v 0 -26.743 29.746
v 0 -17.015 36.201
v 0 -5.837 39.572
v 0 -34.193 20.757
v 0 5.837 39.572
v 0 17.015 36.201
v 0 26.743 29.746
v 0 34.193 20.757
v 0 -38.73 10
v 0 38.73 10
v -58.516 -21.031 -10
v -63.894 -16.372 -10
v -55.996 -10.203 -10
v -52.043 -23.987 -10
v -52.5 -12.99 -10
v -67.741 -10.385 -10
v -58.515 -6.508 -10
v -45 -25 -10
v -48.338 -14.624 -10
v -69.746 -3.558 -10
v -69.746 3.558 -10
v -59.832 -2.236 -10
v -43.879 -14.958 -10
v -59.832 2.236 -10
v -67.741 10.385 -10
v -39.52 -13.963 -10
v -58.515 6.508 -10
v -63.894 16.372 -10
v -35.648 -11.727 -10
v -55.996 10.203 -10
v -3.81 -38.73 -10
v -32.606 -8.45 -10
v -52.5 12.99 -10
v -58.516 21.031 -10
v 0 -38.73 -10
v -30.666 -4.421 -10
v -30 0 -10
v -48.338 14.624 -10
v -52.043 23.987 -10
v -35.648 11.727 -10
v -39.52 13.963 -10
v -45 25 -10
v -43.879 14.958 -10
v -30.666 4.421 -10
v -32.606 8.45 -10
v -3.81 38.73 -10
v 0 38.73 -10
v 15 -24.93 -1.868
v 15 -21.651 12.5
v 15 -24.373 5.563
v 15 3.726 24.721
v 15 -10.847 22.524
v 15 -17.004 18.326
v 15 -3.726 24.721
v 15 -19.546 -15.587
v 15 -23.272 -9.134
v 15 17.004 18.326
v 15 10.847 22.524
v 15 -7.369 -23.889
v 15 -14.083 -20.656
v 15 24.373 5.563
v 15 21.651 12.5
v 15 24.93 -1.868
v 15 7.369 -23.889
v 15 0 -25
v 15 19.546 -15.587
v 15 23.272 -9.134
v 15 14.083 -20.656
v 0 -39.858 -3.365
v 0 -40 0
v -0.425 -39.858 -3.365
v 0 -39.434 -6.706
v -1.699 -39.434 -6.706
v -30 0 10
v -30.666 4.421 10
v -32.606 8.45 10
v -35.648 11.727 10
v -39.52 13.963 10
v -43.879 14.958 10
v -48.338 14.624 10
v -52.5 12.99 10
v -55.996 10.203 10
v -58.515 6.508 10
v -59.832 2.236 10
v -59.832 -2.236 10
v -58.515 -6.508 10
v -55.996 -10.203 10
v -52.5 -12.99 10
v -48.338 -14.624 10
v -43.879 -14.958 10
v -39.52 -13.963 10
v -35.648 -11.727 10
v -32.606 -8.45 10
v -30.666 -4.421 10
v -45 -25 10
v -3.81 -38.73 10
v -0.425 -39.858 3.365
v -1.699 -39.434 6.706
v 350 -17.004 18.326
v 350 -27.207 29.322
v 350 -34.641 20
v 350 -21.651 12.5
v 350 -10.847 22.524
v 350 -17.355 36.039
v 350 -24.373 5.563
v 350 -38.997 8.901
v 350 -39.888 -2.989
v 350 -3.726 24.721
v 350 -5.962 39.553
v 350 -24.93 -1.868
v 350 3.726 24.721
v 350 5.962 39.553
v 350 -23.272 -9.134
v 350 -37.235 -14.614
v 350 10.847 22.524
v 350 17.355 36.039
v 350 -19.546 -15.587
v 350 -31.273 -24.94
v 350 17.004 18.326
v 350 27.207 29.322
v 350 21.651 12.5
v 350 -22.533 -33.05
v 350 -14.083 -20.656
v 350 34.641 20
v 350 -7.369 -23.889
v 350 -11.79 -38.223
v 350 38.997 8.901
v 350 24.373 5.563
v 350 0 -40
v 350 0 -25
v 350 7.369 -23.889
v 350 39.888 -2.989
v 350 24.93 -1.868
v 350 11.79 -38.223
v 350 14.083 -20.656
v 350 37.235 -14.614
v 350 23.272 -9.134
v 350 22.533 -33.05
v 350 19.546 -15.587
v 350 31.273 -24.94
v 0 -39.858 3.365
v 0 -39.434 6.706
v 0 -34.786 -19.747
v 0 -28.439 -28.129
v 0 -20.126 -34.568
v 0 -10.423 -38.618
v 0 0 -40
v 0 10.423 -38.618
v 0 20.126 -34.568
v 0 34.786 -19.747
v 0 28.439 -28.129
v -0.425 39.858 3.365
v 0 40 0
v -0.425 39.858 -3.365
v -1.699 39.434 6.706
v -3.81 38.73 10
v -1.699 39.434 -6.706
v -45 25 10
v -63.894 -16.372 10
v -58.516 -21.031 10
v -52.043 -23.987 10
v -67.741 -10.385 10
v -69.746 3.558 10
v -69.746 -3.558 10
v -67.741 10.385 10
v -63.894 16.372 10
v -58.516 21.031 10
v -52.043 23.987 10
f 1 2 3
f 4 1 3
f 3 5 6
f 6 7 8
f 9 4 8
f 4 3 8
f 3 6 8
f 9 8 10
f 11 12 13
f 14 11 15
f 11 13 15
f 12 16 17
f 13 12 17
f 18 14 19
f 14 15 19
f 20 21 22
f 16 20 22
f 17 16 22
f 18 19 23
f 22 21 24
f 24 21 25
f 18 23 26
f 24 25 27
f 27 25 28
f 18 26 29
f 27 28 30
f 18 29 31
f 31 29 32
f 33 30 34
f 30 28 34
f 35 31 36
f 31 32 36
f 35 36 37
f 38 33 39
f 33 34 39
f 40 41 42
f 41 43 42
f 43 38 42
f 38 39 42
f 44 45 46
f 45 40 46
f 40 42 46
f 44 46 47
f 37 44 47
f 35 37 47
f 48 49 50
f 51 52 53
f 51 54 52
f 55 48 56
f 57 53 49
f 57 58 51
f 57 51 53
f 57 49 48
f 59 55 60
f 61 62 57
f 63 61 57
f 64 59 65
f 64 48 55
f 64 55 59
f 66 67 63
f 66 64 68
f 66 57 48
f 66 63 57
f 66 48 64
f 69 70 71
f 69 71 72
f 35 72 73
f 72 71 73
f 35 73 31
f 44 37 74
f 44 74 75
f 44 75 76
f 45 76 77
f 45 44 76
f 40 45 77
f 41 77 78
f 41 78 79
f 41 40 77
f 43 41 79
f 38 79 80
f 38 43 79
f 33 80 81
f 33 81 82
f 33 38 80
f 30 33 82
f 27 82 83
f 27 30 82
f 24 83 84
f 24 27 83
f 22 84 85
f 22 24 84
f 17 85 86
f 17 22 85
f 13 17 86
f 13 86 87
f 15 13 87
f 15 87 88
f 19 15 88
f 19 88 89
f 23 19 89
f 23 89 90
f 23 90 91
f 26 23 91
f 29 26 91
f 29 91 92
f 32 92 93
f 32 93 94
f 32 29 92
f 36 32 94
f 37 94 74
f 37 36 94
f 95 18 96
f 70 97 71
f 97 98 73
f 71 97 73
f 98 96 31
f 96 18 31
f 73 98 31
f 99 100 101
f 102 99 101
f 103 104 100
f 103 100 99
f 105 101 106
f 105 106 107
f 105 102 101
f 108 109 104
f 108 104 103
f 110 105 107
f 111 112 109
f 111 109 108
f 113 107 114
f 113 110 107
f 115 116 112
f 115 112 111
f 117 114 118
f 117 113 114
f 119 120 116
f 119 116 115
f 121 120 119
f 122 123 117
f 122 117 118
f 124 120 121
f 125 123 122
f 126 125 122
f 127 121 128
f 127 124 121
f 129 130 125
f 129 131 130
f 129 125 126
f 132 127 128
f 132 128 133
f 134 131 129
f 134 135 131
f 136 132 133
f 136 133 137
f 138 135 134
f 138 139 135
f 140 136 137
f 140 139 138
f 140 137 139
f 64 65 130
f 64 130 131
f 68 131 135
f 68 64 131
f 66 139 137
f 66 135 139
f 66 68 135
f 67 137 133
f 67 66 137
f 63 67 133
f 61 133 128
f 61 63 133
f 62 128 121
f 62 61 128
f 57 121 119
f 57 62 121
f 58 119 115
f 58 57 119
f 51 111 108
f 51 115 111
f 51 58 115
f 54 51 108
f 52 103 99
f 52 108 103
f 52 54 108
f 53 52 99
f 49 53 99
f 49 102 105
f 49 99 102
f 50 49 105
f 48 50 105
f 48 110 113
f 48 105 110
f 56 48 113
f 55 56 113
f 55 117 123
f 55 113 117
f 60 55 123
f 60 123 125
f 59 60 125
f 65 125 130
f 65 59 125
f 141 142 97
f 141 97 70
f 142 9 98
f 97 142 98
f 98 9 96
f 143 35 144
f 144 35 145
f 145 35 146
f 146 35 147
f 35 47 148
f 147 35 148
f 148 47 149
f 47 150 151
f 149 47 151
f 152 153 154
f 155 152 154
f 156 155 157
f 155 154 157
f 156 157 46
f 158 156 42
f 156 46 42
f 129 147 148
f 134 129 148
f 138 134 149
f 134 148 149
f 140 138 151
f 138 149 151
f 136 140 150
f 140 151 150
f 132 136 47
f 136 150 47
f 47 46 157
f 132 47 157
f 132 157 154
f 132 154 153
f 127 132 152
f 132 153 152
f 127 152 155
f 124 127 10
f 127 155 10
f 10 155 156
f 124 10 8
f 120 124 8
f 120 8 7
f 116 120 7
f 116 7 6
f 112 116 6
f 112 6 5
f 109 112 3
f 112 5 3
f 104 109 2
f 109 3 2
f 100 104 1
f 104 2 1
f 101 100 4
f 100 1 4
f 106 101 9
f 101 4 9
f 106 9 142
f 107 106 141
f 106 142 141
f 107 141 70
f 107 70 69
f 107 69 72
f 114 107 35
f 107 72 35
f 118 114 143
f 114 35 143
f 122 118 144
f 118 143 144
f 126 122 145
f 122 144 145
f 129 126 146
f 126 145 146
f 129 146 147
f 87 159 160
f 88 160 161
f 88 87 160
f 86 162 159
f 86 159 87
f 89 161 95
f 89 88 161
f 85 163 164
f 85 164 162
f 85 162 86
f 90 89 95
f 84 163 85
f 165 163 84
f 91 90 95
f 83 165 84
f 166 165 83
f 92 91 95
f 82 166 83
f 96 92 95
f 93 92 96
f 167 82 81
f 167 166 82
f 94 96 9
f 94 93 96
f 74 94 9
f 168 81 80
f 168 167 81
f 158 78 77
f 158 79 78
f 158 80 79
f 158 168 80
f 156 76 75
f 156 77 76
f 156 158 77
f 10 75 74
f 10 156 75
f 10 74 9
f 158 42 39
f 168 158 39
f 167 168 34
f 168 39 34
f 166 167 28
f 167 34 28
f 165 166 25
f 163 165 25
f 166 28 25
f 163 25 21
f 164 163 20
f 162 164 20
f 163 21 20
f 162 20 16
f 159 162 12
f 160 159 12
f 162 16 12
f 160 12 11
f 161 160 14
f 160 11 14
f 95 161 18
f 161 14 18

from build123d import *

# Parameters (mm, degrees)
SKETCH1_R                = 40
BOSS_EXTRUDE1_DEPTH      = 350
SHELL1_T                 = -15
BOSS_EXTRUDE2_DEPTH      = 10
BOSS_EXTRUDE2_DEPTH_BACK = 10
SKETCH3_R                = 15
CUT_EXTRUDE1_START       = -68
SKETCH4_R                = 50.16795499
SKETCH4_R_2              = 40
CUT_EXTRUDE1_DEPTH       = 68


with BuildPart() as part:
    # Sketch1 → Boss-Extrude1 (new body)
    with BuildSketch(Plane(origin=(0, 0, 0), x_dir=(0, 0, -1), z_dir=(1, 0, 0))):
        Circle(SKETCH1_R)
    extrude(amount=BOSS_EXTRUDE1_DEPTH)

    # Shell1
    shell1_openings = [part.faces().sort_by_distance(p)[0] for p in [
        (350, 0, 0),
    ]]
    offset(amount=SHELL1_T, openings=shell1_openings, kind=Kind.INTERSECTION)

    # Sketch3 → Boss-Extrude2 (add, two sides: drawn at the far end of the back side and taken through both)
    with BuildSketch(Plane.XY.offset(-BOSS_EXTRUDE2_DEPTH_BACK)):
        with BuildLine():
            Line((0, 40), (-45, 25))
            ThreePointArc((-45, 25), (-70, 0), (-45, -25))
            Line((-45, -25), (0, -40))
            Line((0, -40), (0, 40))
        make_face()
        with Locations((-45, 0)):
            Circle(SKETCH3_R, mode=Mode.SUBTRACT)
    extrude(amount=BOSS_EXTRUDE2_DEPTH + BOSS_EXTRUDE2_DEPTH_BACK)

    # Sketch4 → Cut-Extrude1 (cut)
    with BuildSketch(Plane(origin=(0, 0, 0), x_dir=(0, 0, -1), z_dir=(1, 0, 0)).offset(CUT_EXTRUDE1_START)):
        Circle(SKETCH4_R)
        Circle(SKETCH4_R_2, mode=Mode.SUBTRACT)
    extrude(amount=CUT_EXTRUDE1_DEPTH, mode=Mode.SUBTRACT)


solid = part.part
